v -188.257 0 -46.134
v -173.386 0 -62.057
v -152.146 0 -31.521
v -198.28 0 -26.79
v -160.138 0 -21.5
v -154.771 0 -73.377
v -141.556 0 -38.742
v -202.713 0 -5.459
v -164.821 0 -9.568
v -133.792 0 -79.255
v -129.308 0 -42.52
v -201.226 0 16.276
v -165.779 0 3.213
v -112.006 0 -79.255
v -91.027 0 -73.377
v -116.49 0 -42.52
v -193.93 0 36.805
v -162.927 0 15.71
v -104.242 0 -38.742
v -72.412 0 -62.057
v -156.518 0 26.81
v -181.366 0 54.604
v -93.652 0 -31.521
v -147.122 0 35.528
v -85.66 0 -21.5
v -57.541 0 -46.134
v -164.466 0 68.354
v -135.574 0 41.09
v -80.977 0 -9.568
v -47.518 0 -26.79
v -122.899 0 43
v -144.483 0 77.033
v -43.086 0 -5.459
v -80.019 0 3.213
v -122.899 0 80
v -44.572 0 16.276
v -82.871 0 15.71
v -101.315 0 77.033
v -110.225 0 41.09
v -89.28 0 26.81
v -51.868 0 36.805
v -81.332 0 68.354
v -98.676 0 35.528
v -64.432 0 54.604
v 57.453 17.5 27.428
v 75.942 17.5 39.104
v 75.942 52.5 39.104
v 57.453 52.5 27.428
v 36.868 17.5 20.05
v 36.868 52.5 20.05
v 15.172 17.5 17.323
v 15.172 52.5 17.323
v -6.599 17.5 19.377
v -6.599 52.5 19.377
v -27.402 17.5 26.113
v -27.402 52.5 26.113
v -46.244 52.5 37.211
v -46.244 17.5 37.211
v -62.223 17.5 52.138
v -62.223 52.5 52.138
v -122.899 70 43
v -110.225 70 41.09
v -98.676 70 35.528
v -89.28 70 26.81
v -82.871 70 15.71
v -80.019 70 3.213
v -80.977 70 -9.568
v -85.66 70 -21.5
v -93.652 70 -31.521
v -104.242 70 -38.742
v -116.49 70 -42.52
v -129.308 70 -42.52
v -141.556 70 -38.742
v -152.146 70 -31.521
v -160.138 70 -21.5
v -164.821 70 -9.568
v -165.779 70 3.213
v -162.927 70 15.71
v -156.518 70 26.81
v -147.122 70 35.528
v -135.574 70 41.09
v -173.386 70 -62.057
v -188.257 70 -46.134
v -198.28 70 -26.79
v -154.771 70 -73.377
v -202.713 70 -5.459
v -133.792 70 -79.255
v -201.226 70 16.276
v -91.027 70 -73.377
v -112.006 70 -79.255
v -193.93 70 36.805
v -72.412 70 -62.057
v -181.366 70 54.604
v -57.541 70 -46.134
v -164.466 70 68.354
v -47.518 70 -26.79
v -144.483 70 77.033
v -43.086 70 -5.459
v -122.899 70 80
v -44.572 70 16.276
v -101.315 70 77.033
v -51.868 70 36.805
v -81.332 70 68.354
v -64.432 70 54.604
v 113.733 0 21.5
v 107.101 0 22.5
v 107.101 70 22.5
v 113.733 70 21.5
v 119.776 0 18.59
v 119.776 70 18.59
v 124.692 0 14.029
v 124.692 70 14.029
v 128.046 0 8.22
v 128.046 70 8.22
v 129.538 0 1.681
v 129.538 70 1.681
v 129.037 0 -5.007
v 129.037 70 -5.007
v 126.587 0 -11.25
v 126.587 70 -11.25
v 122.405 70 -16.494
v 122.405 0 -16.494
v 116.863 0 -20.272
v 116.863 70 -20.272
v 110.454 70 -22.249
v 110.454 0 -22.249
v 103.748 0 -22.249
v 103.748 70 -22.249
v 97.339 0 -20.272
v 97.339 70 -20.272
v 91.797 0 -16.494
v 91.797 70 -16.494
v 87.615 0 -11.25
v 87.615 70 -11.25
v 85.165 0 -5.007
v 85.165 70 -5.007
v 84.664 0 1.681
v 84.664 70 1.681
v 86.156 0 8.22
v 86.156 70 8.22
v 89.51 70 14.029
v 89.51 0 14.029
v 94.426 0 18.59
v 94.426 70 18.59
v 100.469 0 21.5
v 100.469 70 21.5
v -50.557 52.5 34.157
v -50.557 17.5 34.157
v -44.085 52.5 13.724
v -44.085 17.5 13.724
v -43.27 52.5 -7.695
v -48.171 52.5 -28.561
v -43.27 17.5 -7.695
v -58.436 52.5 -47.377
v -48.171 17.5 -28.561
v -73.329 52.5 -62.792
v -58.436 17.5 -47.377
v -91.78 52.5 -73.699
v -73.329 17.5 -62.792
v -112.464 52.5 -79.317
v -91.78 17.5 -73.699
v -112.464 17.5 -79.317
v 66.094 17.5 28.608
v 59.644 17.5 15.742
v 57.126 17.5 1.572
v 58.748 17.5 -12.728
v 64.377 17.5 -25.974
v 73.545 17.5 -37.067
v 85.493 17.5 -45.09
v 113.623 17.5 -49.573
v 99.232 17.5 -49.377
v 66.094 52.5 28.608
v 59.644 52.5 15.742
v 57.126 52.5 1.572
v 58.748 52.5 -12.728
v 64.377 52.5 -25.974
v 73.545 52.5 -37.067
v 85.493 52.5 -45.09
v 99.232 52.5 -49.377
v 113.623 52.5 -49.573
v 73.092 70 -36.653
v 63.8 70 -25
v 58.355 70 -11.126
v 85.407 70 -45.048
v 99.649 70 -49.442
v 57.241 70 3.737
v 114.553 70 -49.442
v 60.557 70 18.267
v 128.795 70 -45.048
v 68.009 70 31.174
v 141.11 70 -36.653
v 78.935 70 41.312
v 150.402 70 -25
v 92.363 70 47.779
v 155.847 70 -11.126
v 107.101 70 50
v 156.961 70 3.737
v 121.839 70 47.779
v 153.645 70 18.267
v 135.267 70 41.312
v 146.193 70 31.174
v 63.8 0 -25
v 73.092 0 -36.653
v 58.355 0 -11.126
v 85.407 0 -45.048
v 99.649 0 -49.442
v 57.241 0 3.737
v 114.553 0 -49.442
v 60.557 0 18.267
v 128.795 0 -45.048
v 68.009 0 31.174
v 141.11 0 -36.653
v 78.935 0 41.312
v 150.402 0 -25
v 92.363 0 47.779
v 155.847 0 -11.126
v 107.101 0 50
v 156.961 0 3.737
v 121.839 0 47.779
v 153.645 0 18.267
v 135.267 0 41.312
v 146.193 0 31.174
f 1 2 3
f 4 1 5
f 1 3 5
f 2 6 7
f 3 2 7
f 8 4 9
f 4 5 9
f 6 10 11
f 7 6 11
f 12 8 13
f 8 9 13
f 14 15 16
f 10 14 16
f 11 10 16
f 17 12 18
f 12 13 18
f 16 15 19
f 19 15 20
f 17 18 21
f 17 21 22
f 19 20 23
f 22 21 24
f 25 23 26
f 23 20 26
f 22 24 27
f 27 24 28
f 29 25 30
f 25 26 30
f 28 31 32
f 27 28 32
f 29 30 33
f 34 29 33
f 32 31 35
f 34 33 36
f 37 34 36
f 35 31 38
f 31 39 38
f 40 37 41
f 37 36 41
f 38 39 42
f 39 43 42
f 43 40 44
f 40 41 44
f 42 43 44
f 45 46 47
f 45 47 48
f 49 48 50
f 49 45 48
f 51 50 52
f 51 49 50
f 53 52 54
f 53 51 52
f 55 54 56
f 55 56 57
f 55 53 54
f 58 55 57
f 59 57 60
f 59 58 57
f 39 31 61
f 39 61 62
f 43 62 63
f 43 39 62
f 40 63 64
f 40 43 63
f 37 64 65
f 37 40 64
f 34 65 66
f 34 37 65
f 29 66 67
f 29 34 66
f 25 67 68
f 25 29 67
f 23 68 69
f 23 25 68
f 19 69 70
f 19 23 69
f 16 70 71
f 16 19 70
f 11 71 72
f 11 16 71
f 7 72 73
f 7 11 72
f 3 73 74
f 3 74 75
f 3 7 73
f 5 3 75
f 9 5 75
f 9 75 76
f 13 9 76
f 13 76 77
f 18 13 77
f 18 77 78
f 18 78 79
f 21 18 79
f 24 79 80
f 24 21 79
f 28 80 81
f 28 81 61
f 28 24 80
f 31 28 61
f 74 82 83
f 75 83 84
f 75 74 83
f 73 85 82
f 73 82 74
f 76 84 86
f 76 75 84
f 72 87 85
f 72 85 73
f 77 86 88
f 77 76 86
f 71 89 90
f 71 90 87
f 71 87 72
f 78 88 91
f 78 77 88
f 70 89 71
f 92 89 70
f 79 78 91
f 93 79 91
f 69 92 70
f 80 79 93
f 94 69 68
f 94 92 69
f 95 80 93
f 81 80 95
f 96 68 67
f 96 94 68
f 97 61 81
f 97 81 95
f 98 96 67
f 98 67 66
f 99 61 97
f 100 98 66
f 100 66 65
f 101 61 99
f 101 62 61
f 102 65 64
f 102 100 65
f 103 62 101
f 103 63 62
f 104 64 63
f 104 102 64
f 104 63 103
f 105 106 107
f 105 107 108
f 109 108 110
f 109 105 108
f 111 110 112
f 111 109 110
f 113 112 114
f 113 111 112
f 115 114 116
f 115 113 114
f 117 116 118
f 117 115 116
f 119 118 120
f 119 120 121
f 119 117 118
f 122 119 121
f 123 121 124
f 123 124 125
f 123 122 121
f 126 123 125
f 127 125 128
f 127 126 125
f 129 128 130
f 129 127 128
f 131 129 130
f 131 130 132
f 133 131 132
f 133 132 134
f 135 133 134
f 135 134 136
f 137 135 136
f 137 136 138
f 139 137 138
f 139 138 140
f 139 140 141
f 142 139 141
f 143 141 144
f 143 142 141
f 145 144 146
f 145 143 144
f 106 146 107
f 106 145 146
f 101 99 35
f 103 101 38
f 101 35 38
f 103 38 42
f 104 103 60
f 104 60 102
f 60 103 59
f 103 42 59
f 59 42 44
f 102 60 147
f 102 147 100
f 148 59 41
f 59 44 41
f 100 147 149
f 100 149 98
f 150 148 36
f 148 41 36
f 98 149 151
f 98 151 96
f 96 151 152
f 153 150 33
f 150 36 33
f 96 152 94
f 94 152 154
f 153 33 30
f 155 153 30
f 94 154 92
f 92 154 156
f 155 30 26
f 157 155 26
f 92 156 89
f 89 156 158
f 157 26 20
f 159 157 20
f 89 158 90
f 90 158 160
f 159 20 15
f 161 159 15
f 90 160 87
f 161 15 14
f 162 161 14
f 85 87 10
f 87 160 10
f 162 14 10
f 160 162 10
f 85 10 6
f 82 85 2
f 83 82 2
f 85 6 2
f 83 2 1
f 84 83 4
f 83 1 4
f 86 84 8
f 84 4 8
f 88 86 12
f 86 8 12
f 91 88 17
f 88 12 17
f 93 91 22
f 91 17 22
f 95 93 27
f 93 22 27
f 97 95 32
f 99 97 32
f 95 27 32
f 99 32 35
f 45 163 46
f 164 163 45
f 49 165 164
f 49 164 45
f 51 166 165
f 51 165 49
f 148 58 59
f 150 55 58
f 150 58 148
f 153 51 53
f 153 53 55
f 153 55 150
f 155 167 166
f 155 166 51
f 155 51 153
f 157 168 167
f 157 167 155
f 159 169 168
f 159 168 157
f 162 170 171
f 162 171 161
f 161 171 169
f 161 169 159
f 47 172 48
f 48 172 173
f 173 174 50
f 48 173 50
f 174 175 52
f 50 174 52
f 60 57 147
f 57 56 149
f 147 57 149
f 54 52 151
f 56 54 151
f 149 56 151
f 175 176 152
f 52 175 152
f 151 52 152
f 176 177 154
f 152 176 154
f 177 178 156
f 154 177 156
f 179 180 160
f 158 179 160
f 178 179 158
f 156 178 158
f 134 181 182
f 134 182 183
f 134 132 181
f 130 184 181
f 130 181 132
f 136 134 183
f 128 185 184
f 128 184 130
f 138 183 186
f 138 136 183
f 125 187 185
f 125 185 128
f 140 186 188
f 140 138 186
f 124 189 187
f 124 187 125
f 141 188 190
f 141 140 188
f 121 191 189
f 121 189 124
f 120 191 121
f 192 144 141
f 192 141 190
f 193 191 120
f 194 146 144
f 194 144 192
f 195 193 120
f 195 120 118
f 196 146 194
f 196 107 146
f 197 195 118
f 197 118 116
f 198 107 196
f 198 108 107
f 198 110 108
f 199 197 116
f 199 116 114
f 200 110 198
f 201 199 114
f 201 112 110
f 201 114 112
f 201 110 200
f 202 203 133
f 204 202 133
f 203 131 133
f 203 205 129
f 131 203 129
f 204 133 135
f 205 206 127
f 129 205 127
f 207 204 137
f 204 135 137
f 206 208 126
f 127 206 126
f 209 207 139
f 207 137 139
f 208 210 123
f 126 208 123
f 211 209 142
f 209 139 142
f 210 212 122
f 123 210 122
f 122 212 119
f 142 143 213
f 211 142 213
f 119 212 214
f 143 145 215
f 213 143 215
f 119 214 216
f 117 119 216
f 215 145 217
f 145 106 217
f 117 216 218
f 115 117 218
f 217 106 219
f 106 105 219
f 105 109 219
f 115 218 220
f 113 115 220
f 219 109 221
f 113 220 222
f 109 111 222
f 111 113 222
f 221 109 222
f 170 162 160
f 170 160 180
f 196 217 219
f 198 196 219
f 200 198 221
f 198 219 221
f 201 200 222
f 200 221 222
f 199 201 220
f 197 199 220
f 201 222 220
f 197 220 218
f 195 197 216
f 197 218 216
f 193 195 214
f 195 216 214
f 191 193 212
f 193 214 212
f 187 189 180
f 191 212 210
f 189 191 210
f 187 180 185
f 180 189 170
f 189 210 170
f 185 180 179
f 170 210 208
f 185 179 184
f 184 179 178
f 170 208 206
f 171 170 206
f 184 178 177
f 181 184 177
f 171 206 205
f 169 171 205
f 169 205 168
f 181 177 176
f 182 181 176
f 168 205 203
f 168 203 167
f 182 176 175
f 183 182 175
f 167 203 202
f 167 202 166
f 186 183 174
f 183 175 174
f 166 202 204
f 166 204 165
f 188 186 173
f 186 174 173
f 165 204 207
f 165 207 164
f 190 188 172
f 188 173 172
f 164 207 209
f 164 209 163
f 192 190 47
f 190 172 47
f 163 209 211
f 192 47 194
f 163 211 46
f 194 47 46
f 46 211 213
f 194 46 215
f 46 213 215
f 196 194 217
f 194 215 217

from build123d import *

# Parameters (mm, degrees)
SKETCH_1_R        = 80
SKETCH_1_R_2      = 43
EXTRUDE_1_DEPTH   = 70
SKETCH_1_R_3      = 50
SKETCH_1_R_4      = 22.5
EXTRUDE_1_2_DEPTH = 70
EXTRUDE_START     = -52.5
EXTRUDE_2_DEPTH   = 35


with BuildPart() as part:
    # 스케치1 → 보스-돌출1 (new body)
    with BuildSketch(Plane(origin=(0, 0, 0), x_dir=(1, 0, 0), z_dir=(0, 1, 0))):
        with Locations(Location((-122.899042893, 0, 0), (0, 0, 270))):
            Circle(SKETCH_1_R)
        with Locations(Location((-122.899042893, 0, 0), (0, 0, 270))):
            Circle(SKETCH_1_R_2, mode=Mode.SUBTRACT)
    extrude(amount=EXTRUDE_1_DEPTH)



with BuildPart() as body_2:
    # 스케치1 → Extrude 1 2 (new body)
    with BuildSketch(Plane(origin=(0, 0, 0), x_dir=(1, 0, 0), z_dir=(0, 1, 0))):
        with Locations(Location((107.100957107, 0, 0), (0, 0, 270))):
            Circle(SKETCH_1_R_3)
        with Locations(Location((107.100957107, 0, 0), (0, 0, 270))):
            Circle(SKETCH_1_R_4, mode=Mode.SUBTRACT)
    extrude(amount=EXTRUDE_1_2_DEPTH)


with BuildPart() as part_1:
    add(part.part)

    add(body_2.part)  # 보스-돌출2 merges body 2
    # 스케치2 → 보스-돌출2 (add)
    with BuildSketch(Plane(origin=(0, 70, 0), x_dir=(1, 0, 0), z_dir=(0, 1, 0)).offset(EXTRUDE_START)):
        with BuildLine():
            Line((-112.464260284, 79.316551311), (113.622696237, 49.57284457))
            ThreePointArc((113.622696237, 49.57284457), (61.083229888, 19.554252264), (75.941536817, -39.10358714))
            ThreePointArc((75.941536817, -39.10358714), (4.230318414, -17.752822315), (-62.222714391, -52.138116186))
            ThreePointArc((-62.222714391, -52.138116186), (-48.171003091, 28.560813493), (-112.464260284, 79.316551311))
        make_face()
    extrude(amount=EXTRUDE_2_DEPTH)


solid = part_1.part
